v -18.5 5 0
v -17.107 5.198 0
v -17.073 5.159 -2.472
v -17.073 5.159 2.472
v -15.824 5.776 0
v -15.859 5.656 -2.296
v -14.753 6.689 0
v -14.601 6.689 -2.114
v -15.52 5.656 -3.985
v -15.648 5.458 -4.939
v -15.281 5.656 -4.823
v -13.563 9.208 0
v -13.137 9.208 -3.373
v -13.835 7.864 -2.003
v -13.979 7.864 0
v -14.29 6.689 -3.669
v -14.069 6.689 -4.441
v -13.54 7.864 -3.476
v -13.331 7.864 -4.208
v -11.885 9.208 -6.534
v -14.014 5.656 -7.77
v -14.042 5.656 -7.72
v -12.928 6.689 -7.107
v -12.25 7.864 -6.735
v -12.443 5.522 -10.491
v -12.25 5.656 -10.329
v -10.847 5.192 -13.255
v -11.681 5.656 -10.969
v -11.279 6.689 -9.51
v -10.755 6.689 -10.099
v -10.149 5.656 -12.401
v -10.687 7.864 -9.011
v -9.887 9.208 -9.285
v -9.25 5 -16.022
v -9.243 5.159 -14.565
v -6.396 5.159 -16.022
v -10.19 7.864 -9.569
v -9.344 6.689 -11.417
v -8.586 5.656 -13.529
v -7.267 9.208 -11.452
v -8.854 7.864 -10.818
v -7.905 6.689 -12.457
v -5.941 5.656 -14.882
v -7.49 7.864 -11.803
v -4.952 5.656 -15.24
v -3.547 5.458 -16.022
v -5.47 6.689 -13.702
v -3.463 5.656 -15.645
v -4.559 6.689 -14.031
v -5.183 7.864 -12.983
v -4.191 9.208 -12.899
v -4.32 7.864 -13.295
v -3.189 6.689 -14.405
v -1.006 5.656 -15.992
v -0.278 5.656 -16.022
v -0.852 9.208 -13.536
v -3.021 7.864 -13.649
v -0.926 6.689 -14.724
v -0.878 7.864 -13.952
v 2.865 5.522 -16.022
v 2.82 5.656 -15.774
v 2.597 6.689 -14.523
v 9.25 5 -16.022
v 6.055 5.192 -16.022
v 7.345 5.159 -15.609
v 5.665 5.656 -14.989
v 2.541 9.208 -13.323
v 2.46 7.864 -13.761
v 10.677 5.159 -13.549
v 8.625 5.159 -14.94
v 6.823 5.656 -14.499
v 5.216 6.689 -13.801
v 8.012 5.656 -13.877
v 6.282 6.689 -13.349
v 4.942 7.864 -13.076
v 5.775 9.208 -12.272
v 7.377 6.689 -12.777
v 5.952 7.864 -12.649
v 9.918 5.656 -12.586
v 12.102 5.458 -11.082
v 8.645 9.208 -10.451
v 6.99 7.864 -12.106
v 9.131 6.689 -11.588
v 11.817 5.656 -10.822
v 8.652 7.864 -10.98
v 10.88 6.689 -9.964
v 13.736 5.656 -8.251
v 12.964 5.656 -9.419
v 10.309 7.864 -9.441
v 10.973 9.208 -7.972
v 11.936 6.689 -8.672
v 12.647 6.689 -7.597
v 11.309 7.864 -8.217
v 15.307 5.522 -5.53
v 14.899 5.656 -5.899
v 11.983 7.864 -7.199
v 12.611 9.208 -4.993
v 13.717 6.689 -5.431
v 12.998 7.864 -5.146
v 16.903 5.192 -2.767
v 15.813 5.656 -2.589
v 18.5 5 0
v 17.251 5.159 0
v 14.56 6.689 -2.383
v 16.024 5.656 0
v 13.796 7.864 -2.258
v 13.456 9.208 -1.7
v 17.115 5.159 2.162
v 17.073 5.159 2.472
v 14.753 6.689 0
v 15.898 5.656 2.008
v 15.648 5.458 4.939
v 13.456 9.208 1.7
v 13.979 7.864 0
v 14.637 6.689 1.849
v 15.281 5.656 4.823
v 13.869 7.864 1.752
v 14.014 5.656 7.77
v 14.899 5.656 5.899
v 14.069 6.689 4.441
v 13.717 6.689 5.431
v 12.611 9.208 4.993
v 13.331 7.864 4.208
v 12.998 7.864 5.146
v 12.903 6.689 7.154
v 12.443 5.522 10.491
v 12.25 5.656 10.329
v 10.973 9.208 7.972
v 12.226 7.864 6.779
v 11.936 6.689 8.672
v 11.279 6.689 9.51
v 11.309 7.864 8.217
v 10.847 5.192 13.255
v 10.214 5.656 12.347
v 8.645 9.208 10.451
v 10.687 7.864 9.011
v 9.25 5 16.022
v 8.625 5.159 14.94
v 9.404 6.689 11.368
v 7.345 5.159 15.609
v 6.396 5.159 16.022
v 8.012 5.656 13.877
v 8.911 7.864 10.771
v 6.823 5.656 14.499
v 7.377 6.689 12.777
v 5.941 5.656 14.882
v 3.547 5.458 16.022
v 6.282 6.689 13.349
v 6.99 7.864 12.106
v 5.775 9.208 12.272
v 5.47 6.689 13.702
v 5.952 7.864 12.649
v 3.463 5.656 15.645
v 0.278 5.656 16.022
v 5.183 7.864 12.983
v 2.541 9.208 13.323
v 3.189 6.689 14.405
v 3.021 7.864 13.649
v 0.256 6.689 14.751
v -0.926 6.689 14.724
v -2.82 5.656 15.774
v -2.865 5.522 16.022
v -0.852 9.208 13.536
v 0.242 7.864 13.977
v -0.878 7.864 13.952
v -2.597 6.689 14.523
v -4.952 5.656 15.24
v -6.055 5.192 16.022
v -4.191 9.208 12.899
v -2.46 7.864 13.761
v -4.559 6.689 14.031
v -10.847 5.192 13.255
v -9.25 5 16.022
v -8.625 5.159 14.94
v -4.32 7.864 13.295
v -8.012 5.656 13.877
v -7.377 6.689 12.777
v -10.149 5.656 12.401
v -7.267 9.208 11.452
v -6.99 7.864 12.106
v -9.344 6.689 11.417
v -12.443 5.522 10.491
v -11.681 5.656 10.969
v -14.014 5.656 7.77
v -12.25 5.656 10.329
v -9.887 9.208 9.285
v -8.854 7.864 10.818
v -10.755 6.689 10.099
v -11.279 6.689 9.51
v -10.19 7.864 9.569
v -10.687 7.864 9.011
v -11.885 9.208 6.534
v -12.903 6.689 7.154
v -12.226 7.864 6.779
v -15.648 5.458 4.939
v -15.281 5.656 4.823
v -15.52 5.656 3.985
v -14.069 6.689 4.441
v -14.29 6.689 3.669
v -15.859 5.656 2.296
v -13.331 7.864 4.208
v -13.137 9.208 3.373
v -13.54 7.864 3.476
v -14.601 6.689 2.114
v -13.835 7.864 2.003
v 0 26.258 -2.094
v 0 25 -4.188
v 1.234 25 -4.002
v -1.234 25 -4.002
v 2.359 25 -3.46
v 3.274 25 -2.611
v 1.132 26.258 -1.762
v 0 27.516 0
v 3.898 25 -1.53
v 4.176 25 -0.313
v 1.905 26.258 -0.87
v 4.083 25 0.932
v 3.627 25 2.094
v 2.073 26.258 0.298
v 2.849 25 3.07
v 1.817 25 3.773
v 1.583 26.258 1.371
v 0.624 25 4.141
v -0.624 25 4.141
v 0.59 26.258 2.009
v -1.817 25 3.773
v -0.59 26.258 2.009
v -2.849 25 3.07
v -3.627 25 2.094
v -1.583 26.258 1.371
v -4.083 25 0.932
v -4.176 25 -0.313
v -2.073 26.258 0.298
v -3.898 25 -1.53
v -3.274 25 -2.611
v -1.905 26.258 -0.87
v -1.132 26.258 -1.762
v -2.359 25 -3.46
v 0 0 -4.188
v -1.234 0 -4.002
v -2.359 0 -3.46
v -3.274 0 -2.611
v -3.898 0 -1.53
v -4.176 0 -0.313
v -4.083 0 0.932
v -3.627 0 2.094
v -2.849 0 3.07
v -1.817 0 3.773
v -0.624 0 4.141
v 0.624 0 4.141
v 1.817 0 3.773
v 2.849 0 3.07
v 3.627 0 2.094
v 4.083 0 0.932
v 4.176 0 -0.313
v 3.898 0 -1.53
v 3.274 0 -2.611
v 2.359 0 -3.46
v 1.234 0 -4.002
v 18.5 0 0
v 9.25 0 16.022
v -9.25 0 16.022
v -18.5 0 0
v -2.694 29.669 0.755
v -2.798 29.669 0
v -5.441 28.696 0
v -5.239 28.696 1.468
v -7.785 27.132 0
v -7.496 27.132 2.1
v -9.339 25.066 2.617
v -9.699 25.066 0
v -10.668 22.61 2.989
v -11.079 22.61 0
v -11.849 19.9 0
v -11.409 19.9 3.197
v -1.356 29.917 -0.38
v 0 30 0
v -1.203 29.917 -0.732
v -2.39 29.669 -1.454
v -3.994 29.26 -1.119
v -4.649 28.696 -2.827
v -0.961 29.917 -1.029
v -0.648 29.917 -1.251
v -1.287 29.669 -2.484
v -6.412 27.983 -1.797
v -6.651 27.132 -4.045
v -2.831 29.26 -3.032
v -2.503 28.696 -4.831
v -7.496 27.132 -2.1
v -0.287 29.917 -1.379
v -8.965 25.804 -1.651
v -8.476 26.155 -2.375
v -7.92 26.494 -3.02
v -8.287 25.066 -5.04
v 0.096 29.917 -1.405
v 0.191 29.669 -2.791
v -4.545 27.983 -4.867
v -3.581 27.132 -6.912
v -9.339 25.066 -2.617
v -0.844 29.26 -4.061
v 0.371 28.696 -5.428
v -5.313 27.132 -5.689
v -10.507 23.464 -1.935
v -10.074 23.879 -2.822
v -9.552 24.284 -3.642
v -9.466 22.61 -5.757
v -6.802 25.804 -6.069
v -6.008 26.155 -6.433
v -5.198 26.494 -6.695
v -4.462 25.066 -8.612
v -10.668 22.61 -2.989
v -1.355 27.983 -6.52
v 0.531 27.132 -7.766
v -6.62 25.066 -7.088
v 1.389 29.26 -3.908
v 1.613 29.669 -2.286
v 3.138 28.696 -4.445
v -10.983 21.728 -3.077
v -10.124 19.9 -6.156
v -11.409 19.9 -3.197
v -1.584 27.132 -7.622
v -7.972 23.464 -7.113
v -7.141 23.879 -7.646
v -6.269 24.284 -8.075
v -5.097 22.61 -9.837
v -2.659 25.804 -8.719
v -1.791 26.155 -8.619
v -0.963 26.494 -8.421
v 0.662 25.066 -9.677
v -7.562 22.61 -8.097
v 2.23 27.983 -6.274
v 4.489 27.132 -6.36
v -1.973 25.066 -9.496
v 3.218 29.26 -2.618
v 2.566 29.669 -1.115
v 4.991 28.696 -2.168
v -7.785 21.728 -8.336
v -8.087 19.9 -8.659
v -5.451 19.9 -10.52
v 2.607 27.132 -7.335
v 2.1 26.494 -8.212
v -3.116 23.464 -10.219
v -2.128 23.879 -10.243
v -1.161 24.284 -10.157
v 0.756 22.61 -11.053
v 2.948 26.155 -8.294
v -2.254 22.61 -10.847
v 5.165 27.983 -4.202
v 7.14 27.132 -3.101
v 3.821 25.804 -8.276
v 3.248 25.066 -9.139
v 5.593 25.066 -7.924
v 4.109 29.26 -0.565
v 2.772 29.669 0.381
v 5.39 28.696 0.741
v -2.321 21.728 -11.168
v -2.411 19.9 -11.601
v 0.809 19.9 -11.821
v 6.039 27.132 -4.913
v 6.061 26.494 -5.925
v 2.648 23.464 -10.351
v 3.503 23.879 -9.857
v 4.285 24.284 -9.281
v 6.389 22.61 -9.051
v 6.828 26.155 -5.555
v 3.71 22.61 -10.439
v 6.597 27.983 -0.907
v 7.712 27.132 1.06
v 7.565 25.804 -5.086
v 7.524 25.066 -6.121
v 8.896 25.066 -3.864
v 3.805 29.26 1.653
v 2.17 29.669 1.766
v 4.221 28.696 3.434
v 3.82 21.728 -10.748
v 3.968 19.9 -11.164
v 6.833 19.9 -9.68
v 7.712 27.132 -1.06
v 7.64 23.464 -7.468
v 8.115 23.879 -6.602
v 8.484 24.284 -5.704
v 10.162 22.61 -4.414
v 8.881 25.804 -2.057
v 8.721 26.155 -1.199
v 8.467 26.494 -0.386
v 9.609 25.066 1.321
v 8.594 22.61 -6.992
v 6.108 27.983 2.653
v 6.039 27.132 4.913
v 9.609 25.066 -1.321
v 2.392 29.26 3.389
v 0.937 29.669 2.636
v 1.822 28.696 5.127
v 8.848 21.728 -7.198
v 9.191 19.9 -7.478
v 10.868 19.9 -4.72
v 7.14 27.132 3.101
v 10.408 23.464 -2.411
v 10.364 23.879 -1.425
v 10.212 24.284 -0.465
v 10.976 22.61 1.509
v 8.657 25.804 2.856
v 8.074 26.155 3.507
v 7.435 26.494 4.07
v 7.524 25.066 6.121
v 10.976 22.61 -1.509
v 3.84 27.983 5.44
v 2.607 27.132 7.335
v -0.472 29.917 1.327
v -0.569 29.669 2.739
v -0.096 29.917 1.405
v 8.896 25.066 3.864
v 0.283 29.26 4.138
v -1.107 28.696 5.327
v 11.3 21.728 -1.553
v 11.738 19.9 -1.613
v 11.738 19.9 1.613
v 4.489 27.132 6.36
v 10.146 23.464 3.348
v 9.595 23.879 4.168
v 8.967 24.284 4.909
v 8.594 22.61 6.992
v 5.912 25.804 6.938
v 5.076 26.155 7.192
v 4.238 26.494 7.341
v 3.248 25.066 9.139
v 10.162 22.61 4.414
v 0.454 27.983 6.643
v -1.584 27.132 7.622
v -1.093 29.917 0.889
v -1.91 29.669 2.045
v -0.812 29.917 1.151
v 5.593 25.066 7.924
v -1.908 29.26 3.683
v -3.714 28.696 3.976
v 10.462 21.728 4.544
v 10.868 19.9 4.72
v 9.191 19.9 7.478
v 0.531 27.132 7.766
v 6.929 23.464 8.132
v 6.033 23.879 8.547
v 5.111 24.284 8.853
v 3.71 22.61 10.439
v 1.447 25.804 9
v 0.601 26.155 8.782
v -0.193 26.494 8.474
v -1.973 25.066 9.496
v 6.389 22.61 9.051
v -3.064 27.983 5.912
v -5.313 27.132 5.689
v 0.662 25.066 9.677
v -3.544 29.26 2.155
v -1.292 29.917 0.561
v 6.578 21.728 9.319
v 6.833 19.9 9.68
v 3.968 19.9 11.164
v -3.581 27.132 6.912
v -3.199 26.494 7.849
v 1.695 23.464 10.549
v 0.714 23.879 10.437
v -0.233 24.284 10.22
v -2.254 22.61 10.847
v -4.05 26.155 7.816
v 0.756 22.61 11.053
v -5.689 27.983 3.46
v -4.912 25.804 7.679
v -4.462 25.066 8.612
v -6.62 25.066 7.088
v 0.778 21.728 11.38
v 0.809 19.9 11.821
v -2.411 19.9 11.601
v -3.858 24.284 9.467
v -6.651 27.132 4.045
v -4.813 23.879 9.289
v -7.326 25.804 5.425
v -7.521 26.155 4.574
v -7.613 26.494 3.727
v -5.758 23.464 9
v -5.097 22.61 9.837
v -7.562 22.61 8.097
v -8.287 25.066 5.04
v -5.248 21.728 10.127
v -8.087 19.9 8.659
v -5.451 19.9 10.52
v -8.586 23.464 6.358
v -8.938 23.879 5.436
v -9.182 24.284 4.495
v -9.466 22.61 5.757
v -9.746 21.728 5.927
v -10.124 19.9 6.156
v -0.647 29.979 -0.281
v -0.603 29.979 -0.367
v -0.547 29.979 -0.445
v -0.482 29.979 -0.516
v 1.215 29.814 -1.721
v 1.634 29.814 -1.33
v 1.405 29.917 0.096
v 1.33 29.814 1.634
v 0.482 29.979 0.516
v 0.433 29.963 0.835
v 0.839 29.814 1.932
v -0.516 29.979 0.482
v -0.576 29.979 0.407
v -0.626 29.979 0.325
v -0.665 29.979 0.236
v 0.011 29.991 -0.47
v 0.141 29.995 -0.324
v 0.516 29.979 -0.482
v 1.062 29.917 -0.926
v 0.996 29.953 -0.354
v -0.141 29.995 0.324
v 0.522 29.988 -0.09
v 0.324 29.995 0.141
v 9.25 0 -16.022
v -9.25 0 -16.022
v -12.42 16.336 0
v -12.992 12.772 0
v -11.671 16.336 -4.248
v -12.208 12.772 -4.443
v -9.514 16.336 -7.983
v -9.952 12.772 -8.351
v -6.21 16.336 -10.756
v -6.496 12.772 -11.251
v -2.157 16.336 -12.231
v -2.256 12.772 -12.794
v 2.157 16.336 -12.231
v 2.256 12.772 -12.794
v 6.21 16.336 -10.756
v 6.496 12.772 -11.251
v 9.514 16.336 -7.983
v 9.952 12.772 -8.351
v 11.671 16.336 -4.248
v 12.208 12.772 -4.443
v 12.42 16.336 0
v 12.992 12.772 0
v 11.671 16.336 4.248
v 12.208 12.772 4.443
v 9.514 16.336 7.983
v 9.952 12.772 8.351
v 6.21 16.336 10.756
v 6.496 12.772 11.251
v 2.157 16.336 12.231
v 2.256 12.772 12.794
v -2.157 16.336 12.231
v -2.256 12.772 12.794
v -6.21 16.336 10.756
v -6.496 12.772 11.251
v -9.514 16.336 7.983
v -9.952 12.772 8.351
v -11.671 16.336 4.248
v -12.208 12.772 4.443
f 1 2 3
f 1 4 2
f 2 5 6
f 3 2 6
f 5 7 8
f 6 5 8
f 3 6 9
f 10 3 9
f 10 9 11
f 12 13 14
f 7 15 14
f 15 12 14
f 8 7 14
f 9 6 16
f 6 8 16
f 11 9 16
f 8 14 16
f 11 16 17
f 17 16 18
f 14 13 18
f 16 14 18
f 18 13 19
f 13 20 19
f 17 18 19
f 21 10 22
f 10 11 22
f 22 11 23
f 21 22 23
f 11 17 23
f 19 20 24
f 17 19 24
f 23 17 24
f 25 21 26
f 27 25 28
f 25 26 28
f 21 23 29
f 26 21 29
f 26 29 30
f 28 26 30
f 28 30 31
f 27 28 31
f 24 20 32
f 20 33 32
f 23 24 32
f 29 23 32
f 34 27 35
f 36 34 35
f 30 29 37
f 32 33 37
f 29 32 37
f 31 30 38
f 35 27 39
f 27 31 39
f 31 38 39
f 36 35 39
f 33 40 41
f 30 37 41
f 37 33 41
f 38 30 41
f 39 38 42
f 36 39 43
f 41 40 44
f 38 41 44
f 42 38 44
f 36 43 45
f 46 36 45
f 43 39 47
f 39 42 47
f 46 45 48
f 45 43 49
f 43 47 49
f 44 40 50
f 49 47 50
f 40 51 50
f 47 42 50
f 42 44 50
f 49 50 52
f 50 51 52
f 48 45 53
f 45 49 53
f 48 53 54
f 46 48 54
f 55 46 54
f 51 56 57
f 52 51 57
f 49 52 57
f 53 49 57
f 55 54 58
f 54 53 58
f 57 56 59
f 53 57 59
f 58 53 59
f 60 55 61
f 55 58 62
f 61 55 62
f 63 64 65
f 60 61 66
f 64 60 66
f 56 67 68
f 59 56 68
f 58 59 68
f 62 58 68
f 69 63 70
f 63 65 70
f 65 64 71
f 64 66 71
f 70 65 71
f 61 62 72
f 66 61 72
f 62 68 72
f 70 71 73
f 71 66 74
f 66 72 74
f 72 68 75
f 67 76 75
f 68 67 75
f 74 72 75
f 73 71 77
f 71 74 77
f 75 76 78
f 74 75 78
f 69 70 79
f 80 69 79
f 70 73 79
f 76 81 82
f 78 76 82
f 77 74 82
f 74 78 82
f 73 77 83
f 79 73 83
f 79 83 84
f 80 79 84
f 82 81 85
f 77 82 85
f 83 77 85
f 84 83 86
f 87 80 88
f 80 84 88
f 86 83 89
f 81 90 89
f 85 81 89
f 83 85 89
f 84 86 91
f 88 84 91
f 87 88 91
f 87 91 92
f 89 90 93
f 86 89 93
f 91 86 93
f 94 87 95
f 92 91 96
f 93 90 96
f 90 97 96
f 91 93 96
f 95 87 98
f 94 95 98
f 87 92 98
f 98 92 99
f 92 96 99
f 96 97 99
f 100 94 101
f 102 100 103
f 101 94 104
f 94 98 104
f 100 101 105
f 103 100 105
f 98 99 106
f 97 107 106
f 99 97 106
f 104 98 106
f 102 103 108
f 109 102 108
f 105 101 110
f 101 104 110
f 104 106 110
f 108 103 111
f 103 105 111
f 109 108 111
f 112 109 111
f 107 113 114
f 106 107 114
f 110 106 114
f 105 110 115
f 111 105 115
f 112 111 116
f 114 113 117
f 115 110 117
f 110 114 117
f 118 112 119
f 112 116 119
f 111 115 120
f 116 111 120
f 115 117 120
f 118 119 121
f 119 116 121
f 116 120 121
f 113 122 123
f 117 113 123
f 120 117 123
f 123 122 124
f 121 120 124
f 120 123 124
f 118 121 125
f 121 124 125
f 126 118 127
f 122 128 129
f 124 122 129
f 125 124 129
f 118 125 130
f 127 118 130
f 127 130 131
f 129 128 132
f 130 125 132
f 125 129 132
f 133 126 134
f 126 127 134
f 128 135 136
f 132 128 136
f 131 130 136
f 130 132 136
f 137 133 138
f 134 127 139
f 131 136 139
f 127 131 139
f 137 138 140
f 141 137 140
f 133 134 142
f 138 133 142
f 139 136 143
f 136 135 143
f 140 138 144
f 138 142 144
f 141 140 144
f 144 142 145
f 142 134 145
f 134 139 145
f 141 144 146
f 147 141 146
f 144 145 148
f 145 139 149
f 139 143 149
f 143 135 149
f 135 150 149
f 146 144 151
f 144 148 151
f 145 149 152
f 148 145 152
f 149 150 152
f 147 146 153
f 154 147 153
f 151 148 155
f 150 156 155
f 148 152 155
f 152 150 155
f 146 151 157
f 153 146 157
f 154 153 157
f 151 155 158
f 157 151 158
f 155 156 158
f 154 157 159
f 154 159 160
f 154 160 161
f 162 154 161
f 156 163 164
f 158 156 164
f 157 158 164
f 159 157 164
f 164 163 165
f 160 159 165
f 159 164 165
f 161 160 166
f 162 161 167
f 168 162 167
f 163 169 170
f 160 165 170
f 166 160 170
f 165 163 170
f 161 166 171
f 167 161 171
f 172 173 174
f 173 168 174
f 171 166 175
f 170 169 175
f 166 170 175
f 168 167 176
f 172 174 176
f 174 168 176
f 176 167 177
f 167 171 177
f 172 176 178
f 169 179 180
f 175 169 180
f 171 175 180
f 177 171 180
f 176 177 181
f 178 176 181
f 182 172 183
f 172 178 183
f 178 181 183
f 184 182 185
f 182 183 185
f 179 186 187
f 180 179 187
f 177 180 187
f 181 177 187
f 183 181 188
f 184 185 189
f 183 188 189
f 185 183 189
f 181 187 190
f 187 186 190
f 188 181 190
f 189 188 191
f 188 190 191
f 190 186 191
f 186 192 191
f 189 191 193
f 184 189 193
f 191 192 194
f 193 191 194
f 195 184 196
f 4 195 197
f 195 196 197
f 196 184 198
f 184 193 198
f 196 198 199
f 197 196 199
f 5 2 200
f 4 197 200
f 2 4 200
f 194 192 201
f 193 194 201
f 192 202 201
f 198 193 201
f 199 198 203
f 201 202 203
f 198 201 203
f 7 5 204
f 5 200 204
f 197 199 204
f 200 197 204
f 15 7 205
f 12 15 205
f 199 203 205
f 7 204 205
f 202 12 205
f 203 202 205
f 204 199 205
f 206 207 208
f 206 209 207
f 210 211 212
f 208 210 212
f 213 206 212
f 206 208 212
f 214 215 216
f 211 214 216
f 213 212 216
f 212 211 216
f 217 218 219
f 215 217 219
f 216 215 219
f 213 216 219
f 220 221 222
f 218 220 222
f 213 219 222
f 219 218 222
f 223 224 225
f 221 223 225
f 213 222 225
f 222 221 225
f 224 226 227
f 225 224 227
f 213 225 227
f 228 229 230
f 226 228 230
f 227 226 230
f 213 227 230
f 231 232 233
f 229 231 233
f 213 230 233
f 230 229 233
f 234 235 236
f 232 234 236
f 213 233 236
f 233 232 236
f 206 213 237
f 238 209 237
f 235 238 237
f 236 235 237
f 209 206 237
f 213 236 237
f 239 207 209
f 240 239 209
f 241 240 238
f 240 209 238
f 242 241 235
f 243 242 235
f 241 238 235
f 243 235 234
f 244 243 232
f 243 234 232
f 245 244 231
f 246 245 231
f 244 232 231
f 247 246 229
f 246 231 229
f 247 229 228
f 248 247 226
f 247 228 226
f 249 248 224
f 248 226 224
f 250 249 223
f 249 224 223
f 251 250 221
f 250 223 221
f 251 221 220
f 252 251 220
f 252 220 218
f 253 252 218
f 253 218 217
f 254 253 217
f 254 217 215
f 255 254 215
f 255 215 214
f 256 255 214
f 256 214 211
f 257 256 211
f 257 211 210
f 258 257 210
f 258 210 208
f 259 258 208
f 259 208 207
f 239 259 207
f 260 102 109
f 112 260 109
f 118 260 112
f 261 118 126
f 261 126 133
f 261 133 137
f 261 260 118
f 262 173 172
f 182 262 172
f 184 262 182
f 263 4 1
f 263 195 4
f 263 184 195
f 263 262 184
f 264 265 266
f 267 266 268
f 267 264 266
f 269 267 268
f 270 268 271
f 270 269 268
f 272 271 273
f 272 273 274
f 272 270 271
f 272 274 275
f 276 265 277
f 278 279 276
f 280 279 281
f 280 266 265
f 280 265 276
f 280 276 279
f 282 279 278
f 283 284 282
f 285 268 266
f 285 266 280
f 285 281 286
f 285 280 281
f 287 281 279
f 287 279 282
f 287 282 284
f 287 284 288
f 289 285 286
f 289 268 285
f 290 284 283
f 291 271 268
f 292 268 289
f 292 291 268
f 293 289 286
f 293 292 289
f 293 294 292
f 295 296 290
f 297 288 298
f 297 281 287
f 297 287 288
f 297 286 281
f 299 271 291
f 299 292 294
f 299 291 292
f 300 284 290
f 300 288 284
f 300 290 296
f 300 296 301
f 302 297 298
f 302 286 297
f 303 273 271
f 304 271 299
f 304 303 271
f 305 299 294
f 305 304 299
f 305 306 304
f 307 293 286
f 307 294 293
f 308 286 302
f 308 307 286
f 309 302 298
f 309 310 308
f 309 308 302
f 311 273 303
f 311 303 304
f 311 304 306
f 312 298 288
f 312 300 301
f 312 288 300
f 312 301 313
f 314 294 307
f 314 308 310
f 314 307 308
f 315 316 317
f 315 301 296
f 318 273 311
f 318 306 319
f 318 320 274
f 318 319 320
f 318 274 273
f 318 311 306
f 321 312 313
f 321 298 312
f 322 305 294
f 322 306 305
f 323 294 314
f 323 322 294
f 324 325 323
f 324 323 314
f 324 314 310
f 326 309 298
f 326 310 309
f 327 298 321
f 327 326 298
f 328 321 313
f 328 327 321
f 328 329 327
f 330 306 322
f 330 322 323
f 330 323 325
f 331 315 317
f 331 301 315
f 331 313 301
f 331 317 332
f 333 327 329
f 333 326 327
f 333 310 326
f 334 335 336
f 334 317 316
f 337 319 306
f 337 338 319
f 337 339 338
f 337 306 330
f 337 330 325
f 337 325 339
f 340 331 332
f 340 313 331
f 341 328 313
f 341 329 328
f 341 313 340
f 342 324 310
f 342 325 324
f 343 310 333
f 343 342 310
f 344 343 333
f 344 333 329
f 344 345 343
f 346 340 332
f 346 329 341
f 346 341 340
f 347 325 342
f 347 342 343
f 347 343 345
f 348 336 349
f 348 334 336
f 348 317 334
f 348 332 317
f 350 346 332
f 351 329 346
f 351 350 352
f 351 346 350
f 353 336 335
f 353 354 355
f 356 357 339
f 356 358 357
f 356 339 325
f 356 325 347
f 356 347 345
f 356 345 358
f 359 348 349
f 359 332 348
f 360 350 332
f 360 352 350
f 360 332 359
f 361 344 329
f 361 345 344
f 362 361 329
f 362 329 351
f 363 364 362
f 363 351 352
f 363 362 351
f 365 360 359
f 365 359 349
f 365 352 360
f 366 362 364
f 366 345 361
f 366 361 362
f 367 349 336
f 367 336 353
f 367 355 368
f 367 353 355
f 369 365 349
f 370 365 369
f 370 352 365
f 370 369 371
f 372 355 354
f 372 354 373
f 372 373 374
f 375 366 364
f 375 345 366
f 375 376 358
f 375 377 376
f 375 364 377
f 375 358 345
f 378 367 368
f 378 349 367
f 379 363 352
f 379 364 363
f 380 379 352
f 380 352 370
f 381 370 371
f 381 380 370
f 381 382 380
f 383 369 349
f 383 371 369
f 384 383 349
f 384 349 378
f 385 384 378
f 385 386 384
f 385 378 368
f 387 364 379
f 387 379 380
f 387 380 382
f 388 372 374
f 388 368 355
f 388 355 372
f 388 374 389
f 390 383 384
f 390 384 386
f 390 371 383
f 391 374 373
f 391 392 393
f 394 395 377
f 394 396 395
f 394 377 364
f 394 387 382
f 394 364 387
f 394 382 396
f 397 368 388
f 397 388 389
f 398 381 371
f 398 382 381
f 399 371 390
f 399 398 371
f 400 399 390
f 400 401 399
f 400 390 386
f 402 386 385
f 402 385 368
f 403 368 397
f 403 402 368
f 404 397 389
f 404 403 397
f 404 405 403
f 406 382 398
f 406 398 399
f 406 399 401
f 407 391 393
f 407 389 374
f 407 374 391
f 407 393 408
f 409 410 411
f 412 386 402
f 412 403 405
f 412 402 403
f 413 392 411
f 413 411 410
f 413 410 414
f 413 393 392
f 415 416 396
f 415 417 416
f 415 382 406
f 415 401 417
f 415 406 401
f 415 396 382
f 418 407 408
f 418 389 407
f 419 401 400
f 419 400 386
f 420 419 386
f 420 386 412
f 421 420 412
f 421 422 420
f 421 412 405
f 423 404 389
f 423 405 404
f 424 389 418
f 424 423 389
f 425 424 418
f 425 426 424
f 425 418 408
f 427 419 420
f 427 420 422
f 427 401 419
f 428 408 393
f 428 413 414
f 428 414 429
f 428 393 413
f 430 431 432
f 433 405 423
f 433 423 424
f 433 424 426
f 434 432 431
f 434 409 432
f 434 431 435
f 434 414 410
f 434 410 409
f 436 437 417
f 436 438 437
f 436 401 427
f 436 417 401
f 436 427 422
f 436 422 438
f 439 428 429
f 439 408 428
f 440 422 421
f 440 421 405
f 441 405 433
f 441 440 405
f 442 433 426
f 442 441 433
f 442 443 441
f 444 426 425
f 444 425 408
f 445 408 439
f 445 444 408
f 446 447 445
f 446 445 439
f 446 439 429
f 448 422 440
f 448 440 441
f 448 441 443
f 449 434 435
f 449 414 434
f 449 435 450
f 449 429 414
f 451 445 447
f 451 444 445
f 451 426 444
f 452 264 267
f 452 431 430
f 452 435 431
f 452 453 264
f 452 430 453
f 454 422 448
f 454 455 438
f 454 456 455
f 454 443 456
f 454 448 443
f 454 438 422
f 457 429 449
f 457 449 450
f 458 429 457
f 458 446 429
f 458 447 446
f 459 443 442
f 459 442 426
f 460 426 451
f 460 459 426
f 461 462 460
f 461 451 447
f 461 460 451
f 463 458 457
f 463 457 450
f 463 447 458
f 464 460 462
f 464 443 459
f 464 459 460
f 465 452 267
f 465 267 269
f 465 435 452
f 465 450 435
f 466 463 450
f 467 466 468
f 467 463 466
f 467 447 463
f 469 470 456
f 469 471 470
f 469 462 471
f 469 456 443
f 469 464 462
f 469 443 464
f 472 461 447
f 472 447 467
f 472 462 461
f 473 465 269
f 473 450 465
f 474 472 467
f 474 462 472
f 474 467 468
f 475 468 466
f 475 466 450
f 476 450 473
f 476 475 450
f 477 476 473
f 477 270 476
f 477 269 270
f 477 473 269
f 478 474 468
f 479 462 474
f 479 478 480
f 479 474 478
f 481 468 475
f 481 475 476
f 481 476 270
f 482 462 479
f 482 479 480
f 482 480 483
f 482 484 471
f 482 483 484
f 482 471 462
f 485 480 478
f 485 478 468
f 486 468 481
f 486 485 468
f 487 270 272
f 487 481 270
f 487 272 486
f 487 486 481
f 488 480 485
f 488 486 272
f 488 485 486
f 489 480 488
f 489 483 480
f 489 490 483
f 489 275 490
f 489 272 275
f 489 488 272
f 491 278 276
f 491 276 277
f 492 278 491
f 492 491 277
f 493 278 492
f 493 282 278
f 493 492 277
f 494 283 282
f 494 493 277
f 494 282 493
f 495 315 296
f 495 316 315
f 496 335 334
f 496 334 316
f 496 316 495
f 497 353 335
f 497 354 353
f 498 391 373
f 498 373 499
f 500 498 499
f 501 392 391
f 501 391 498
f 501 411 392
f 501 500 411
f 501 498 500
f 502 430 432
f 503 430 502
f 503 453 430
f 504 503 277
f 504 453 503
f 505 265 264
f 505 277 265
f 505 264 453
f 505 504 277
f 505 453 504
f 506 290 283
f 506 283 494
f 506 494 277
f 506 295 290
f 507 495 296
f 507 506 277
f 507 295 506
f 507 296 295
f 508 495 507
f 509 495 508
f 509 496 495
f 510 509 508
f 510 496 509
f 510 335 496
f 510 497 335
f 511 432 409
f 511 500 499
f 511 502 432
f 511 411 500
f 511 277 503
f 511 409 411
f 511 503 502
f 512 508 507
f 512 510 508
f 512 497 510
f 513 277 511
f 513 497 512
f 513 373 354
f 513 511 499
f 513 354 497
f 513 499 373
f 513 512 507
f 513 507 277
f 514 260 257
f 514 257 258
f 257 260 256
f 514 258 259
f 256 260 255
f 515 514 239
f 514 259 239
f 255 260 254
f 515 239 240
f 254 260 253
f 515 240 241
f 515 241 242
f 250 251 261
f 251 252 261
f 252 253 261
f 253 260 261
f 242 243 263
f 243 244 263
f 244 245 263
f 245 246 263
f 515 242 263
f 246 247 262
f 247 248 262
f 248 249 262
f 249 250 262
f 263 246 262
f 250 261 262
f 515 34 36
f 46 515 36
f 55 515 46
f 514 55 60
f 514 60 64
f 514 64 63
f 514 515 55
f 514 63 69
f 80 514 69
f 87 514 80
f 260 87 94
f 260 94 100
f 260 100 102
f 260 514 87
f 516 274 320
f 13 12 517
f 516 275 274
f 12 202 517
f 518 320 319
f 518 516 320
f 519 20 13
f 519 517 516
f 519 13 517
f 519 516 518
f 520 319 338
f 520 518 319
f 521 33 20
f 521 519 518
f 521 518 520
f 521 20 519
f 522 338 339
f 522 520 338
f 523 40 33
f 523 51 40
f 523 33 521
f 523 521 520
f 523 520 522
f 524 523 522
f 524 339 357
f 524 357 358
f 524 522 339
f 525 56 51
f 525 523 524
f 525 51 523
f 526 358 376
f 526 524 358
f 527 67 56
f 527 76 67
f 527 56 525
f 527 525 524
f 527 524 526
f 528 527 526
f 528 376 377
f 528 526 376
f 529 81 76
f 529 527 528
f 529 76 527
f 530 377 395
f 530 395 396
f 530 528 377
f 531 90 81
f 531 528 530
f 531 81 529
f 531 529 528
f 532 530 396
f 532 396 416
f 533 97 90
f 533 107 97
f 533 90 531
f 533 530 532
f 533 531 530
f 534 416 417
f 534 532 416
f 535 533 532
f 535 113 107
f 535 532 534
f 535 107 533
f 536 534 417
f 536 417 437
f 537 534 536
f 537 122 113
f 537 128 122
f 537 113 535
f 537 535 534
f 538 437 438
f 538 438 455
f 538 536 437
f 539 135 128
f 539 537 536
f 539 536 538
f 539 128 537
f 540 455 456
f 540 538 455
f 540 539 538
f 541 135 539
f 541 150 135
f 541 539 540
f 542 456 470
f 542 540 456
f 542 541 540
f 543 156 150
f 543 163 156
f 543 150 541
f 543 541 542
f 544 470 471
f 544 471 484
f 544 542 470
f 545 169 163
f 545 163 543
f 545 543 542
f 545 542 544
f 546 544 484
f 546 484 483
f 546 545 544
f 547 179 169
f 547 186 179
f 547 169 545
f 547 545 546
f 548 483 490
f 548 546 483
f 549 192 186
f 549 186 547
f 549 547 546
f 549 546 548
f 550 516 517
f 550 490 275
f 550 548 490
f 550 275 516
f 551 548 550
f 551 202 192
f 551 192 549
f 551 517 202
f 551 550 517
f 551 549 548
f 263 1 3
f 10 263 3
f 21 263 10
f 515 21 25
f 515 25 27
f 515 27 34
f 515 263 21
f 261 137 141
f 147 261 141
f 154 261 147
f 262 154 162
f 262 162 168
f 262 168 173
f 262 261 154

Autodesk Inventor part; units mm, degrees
ref_plane "YZ Plane" through (0, 0, 0) normal (1, 0, 0) x (0, 1, 0)
ref_plane "XZ Plane" through (0, 0, 0) normal (0, 1, 0) x (-1, 0, 0)
ref_plane "XY Plane" through (0, 0, 0) normal (0, 0, 1) x (1, 0, 0)
sketch "Skizze2" plane through (0, 0, 0) normal (0, 1, 0) x (-1, 0, 0)
  line L0 (18.5, 0) -> (9.25, -16.0215)
  line L1 (9.25, -16.0215) -> (-9.25, -16.0215)
  line L2 (-9.25, -16.0215) -> (-18.5, 0)
  line L3 (-18.5, 0) -> (-9.25, 16.0215)
  line L4 (-9.25, 16.0215) -> (9.25, 16.0215)
  line L5 (9.25, 16.0215) -> (18.5, 0)
  point P0 (0, 0)
  point P1 (0, 0)
  dimension "d8" = 37
extrude "Extrusion1" add sketch "Skizze2" along normal blind 5
sketch "Skizze4" plane through (0, 0, 0) normal (0, 0, 1) x (1, 0, 0)
  line L0 (9.25, 5) -> (-9.25, 5) projected
  line L1 (-9.25, 5) -> (-18.5, 5) projected
  line L2 (18.5, 5) -> (9.25, 5) projected
  arc A0 (-18.5, 5) -> (-13.5631, 9.2083) centre (-18.5, 10) ccw
  line L3 (-13.5631, 9.2083) -> (-11.8486, 19.9)
  arc A1 (0, 30) -> (-11.8486, 19.9) centre (0, 18) ccw
  line L4 (0, 30) -> (0, 0)
  line L5 (9.25, 0) -> (-9.25, 0) projected
  point P0 (0, 5)
  dimension "d11" = 12
  dimension "d12" = 5
  dimension "d13" = 30
revolve "Umdrehung1" add sketch "Skizze4" angle 360 about axis through (0, 30, 0) along (0, -1, 0)
sketch "Skizze5" plane through (0, 0, 0) normal (0, -1, 0) x (1, 0, 0)
  line L0 (-9.25, 16.0215) -> (9.25, 16.0215) projected
  line L1 (-18.5, 0) -> (-9.25, 16.0215) projected
  line L2 (-9.25, -16.0215) -> (-18.5, 0) projected
  line L3 (9.25, -16.0215) -> (-9.25, -16.0215) projected
  line L4 (18.5, 0) -> (9.25, -16.0215) projected
  line L5 (9.25, 16.0215) -> (18.5, 0) projected
  arc A0 (-18.5, 0) -> (-9.25, -16.0215) centre (0, 0) ccw projected
  arc A1 (-9.25, 16.0215) -> (-18.5, 0) centre (0, 0) ccw projected
  arc A2 (9.25, 16.0215) -> (-9.25, 16.0215) centre (0, 0) ccw projected
  arc A3 (18.5, 0) -> (9.25, 16.0215) centre (0, 0) ccw projected
  arc A4 (9.25, -16.0215) -> (18.5, 0) centre (0, 0) ccw projected
  line L6 (9.25, -16.0215) -> (-9.25, -16.0215) projected
  arc A5 (-9.25, -16.0215) -> (9.25, -16.0215) centre (0, 0) ccw projected
  point P0 (0, 0)
extrude "Extrusion4" cut sketch "Skizze5" against normal up to surface contours A2 L0 | L1 A1 | A3 L5 | L2 A0 | A4 L4 | L3 A5
sketch "Skizze6" plane through (0, 0, 0) normal (0, -1, 0) x (1, 0, 0)
  point P0 (0, 0)
  point P1 (0, 0)
hole "Bohrung1" at (0, 0, 0) direction (0, 1, 0) diameter 8.376 depth 25 tip angle 118 thread size "M10x1.5" class "6H" standard "ISO Metric profile"
properties part number "Spinner" material "Bronze, Cast"
